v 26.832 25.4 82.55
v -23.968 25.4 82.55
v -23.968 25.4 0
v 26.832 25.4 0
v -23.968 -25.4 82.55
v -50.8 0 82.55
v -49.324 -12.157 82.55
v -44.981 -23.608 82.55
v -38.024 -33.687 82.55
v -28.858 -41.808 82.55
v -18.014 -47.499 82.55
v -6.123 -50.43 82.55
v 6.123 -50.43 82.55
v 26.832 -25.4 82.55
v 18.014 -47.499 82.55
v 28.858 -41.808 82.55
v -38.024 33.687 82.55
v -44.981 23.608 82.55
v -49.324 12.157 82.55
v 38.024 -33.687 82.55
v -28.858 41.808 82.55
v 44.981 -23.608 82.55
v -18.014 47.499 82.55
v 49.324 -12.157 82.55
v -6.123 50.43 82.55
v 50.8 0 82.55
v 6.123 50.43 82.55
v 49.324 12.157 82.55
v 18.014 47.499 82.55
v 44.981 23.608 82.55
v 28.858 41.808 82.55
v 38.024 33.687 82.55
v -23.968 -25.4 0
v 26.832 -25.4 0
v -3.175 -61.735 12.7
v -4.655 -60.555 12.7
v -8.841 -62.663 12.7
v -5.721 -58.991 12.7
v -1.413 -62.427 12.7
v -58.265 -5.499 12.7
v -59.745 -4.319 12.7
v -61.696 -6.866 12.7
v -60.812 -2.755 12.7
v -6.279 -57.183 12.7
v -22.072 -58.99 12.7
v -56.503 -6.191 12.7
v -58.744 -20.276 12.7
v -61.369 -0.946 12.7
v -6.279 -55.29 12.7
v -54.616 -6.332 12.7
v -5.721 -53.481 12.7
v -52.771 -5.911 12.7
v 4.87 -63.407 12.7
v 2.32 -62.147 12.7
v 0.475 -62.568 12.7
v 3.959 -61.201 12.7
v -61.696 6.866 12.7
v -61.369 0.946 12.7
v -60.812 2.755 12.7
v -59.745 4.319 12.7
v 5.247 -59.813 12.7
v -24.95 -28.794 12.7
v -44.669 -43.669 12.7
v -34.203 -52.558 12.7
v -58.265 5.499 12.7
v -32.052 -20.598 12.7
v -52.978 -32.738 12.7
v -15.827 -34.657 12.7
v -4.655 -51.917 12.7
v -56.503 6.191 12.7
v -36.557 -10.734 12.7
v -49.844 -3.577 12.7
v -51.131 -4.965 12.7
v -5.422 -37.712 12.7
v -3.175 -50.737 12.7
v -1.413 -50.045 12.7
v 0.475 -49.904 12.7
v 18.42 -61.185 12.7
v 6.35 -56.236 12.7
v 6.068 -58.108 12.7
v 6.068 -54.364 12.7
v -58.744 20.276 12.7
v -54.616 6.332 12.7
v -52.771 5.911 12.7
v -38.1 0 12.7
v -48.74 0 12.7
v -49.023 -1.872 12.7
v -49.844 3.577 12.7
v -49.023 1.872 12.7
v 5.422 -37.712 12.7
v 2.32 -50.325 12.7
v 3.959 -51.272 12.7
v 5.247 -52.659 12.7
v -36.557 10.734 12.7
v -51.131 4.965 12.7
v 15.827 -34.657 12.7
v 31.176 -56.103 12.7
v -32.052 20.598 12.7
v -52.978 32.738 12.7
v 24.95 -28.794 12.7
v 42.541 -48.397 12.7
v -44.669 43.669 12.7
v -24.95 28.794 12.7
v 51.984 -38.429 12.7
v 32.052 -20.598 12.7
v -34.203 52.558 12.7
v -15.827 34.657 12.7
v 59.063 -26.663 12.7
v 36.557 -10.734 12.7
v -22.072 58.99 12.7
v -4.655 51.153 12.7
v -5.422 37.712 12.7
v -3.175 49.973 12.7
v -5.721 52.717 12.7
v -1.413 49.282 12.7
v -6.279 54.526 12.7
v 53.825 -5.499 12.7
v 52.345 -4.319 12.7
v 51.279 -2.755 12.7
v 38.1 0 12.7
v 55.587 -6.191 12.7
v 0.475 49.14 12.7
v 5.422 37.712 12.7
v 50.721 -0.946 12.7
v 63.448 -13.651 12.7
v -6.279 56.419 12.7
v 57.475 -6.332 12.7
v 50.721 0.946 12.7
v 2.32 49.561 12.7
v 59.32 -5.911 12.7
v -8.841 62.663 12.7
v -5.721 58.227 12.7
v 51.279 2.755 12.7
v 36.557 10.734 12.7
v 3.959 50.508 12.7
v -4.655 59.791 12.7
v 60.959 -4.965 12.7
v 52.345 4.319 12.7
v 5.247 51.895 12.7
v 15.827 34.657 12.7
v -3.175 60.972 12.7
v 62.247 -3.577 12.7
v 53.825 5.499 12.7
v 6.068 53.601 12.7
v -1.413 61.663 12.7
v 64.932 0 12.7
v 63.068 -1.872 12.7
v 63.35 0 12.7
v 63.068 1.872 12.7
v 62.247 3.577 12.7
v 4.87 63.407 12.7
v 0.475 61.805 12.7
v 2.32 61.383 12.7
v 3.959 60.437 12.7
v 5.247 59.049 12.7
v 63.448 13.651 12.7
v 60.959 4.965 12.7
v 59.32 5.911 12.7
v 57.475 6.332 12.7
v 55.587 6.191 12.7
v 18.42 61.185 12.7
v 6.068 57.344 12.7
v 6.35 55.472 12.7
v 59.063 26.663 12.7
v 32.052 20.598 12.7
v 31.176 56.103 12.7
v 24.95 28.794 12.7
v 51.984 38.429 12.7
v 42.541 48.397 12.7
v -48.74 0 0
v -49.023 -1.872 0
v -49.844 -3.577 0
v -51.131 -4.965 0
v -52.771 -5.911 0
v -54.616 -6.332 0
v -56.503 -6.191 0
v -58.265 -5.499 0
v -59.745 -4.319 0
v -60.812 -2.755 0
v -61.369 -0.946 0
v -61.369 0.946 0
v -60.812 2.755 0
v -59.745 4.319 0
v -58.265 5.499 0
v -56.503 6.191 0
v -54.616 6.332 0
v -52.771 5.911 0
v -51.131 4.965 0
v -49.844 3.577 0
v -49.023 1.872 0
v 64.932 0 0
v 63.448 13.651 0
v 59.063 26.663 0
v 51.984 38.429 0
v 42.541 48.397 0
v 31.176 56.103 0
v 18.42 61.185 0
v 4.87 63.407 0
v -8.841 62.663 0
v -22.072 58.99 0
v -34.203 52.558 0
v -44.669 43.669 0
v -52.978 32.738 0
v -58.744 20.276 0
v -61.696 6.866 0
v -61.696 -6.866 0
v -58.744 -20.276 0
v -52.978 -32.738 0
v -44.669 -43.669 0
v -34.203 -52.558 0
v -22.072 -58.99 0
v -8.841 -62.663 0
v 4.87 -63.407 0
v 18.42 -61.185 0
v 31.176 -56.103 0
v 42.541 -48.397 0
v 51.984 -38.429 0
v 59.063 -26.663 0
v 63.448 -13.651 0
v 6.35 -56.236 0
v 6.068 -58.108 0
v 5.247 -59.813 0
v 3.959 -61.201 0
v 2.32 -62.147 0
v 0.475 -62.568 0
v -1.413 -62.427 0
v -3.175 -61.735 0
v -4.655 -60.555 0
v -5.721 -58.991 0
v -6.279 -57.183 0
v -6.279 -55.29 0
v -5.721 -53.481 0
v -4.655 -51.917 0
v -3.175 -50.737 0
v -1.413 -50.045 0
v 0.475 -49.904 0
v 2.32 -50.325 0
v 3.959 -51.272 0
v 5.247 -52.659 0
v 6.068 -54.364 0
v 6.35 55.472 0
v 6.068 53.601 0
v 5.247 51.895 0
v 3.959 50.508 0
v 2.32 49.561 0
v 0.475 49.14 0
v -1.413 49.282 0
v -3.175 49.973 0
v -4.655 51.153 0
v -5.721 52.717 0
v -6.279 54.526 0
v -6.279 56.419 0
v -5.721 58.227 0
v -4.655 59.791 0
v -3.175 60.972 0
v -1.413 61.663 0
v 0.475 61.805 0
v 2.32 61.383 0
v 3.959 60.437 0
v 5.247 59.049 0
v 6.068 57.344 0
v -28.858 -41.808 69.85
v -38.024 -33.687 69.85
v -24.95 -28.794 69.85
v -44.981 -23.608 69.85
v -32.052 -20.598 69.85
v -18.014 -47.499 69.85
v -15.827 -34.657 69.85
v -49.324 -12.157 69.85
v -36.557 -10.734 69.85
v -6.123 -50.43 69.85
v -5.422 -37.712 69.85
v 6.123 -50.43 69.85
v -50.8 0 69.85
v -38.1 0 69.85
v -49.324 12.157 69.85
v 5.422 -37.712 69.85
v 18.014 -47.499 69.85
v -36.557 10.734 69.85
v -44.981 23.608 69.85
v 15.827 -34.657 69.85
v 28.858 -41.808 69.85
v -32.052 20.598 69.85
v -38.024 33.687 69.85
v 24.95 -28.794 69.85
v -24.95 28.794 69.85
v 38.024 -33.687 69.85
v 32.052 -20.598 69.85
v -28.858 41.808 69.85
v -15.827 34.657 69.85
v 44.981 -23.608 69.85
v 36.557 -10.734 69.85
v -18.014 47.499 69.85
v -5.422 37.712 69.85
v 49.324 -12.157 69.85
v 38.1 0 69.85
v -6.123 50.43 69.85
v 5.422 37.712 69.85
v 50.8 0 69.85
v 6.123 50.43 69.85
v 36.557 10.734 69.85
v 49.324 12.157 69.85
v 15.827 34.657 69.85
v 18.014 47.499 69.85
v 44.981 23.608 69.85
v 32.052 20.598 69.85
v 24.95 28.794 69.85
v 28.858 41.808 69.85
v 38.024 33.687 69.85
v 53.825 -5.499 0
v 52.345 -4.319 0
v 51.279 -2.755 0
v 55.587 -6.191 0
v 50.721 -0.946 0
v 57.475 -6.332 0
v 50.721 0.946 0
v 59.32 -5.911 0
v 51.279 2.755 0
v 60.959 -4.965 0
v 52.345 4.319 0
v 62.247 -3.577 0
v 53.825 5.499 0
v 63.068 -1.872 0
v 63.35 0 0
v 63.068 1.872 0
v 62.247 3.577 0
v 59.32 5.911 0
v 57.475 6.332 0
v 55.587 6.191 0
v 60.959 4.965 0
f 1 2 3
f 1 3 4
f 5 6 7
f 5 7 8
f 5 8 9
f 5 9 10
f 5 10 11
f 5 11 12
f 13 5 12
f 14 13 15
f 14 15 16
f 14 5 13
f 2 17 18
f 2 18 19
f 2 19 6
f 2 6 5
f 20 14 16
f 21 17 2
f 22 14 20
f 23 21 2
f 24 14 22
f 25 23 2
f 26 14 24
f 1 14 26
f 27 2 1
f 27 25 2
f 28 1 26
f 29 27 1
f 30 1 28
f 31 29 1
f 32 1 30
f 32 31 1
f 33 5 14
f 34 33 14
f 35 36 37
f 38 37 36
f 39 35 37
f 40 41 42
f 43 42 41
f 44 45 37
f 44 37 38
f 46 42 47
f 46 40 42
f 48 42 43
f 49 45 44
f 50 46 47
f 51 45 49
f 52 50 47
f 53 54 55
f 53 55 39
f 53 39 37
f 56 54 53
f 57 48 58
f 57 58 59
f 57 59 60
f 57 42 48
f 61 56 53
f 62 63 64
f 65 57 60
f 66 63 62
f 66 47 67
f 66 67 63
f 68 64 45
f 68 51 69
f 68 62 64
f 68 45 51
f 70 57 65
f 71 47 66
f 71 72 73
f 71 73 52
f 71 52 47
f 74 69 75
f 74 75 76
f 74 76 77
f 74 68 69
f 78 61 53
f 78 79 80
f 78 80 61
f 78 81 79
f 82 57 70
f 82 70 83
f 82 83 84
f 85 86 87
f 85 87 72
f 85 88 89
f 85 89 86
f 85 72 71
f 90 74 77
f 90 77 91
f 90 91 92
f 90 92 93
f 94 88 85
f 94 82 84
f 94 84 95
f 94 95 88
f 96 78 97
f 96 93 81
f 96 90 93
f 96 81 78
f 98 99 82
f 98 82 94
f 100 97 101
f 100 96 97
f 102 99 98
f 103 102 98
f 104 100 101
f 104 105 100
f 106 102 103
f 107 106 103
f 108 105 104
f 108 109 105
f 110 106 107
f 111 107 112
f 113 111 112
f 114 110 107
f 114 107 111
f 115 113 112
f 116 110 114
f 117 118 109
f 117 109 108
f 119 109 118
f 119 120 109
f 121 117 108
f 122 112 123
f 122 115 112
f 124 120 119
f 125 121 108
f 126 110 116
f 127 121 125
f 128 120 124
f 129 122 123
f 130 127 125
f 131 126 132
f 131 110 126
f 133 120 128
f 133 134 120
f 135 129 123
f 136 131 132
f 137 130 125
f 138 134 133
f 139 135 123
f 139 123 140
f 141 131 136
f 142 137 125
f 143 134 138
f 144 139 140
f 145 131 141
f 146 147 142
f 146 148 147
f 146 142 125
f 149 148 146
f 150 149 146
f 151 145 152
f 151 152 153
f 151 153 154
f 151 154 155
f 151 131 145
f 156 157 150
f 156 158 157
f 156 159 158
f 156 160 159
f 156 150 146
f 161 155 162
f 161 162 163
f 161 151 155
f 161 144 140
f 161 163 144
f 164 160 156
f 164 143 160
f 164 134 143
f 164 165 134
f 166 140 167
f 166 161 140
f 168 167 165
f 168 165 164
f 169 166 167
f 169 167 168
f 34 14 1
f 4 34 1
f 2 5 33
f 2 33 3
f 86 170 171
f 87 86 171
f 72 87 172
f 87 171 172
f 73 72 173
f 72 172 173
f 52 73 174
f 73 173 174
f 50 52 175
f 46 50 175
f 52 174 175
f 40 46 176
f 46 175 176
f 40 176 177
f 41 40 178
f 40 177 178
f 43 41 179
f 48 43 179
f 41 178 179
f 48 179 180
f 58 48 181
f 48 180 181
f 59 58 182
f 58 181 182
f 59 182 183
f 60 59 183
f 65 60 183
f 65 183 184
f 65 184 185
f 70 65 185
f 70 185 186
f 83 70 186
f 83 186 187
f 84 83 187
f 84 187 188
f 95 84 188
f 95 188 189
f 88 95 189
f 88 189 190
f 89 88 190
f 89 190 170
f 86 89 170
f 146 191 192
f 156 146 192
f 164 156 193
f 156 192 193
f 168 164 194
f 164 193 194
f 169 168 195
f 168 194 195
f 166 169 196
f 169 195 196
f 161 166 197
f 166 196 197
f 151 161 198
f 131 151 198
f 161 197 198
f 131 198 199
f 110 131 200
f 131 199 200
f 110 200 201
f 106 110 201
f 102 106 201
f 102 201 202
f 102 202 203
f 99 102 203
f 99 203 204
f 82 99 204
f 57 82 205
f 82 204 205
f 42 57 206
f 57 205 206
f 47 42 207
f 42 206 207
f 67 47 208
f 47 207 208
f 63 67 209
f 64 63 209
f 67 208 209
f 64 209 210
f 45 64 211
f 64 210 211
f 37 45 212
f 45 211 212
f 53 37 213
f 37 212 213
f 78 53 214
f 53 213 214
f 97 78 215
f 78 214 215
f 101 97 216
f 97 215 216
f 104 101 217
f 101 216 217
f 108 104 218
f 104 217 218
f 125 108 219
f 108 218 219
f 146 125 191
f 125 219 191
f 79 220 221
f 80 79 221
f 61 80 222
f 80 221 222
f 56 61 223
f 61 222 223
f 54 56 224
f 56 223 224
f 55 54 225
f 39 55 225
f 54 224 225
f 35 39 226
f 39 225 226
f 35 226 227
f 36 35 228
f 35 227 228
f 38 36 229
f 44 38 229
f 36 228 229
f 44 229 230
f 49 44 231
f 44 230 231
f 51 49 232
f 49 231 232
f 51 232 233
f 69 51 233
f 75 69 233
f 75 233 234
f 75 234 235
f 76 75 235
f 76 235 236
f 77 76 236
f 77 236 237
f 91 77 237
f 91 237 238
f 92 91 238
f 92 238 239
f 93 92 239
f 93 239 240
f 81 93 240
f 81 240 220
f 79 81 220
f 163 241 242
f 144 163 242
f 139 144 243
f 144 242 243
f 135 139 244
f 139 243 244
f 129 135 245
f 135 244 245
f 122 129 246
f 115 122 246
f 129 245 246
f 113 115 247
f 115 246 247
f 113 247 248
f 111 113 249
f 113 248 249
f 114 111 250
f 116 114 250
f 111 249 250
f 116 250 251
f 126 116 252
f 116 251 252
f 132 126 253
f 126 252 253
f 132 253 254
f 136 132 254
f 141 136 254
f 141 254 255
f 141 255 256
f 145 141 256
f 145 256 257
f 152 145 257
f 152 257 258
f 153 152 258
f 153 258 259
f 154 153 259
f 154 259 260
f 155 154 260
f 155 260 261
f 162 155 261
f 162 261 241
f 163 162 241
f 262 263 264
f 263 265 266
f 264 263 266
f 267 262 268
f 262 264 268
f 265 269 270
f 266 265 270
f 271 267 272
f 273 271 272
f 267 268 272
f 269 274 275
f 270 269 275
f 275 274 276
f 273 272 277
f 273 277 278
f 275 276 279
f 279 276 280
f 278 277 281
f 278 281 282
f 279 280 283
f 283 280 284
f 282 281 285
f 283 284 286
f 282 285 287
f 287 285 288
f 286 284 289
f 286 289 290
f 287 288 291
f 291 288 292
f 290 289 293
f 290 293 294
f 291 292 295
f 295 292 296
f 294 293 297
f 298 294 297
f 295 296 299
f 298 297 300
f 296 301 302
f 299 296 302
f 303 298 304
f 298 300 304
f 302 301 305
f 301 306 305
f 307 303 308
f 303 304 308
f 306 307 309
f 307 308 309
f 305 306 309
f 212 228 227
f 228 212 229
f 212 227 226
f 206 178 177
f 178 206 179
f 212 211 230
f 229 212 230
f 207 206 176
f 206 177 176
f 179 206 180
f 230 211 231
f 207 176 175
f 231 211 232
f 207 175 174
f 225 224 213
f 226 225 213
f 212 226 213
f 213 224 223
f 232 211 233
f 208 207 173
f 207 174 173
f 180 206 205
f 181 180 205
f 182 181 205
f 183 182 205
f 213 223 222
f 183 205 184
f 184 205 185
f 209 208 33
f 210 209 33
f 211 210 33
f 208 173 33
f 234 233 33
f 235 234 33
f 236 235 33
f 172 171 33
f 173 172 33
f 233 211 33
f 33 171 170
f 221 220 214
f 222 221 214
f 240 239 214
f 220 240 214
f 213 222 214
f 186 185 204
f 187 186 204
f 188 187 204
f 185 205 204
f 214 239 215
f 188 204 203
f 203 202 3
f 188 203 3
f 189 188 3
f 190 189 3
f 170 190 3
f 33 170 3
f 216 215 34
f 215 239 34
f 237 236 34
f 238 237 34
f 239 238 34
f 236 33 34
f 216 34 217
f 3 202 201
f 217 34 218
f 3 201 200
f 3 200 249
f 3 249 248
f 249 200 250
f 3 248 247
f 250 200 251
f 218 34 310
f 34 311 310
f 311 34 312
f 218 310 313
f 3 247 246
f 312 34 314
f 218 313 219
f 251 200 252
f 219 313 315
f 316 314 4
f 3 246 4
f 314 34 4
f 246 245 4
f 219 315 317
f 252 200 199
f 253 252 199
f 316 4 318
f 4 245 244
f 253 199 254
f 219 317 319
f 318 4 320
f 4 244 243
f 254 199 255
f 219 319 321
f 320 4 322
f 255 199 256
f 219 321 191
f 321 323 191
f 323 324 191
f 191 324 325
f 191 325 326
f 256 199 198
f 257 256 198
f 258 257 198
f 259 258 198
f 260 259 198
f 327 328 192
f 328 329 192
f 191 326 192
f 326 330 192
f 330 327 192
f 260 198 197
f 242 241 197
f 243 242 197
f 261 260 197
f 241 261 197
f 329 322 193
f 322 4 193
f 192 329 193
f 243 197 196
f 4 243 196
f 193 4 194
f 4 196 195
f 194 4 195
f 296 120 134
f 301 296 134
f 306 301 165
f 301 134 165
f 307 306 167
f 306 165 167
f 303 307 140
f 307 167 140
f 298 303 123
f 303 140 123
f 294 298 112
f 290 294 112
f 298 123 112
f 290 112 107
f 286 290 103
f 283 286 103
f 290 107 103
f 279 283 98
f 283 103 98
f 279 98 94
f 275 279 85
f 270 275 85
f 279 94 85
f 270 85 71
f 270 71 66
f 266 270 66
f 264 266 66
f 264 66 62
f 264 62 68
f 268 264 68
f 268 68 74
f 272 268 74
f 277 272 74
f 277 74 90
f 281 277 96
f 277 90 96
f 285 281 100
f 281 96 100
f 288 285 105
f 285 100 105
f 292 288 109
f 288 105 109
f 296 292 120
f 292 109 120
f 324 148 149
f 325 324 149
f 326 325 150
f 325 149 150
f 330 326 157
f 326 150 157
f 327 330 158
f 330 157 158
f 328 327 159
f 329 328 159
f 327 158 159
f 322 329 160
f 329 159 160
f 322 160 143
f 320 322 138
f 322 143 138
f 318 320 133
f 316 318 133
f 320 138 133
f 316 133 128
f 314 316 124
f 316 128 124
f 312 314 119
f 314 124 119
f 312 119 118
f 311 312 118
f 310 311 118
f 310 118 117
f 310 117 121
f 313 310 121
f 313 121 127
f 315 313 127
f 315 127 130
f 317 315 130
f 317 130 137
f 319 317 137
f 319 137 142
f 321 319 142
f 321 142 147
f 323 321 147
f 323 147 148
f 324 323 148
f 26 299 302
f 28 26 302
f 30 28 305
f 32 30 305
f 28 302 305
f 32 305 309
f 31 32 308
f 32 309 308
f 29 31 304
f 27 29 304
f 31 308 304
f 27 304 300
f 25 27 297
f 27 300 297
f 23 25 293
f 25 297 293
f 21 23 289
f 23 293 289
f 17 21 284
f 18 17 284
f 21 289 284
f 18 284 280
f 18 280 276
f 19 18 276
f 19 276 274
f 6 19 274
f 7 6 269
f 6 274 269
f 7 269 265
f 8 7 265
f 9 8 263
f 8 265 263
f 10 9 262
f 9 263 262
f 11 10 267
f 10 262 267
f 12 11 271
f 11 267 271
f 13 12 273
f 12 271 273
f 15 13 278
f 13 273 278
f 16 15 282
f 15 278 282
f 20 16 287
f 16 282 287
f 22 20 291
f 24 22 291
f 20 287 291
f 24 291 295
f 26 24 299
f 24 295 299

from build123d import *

# Parameters (mm, degrees)
F0_R      = 63.5
F1_DEPTH  = 12.7
F2_R      = 38.1
F3_DEPTH  = 57.15
F4_R      = 50.8
F5_DEPTH  = 12.7
F6_R      = 6.35
F7_DEPTH  = 25.4
F8_R      = 6.35
F9_DEPTH  = 25.4
F10_R     = 6.35
F11_DEPTH = 25.4
F12_R     = 6.35
F13_DEPTH = 25.4
F14_W     = 50.8
F14_H     = 50.8
F15_DEPTH = 101.6


with BuildPart() as f1:
    # F0 (on Top) → F1 (new body)
    with BuildSketch(Plane.XY):
        with Locations((1.4321604976, 0)):
            Circle(F0_R)
    extrude(amount=F1_DEPTH)

    # F2 (on face) → F3 (join)
    with BuildSketch(Plane.XY.offset(12.7)):
        Circle(F2_R)
    extrude(amount=F3_DEPTH)

    # F4 (on face) → F5 (join)
    with BuildSketch(Plane.XY.offset(69.85)):
        Circle(F4_R)
    extrude(amount=F5_DEPTH)

    # F6 (on face) → F7 (cut)
    with BuildSketch(Plane(origin=(0, 0, 0), x_dir=(1, 0, 0), z_dir=(0, 0, -1))):
        with Locations((0, -55.4723255336)):
            Circle(F6_R)
    extrude(amount=-F7_DEPTH, mode=Mode.SUBTRACT)

    # F8 (on face) → F9 (cut)
    with BuildSketch(Plane.XY.offset(12.7)):
        with Locations((56.9999702275, 0)):
            Circle(F8_R)
    extrude(amount=-F9_DEPTH, mode=Mode.SUBTRACT)

    # F10 (on face) → F11 (cut)
    with BuildSketch(Plane(origin=(0, 0, 0), x_dir=(1, 0, 0), z_dir=(0, 0, -1))):
        with Locations((0, 56.2361478806)):
            Circle(F10_R)
    extrude(amount=-F11_DEPTH, mode=Mode.SUBTRACT)

    # F12 (on face) → F13 (cut)
    with BuildSketch(Plane(origin=(0, 0, 0), x_dir=(1, 0, 0), z_dir=(0, 0, -1))):
        with Locations((-55.0904199481, 0)):
            Circle(F12_R)
    extrude(amount=-F13_DEPTH, mode=Mode.SUBTRACT)

    # F14 (on face) → F15 (cut)
    with BuildSketch(Plane.XY.offset(82.55)):
        with Locations((1.4321604976, 0)):
            Rectangle(F14_W, F14_H)
    extrude(amount=-F15_DEPTH, mode=Mode.SUBTRACT)


solid = f1.part
